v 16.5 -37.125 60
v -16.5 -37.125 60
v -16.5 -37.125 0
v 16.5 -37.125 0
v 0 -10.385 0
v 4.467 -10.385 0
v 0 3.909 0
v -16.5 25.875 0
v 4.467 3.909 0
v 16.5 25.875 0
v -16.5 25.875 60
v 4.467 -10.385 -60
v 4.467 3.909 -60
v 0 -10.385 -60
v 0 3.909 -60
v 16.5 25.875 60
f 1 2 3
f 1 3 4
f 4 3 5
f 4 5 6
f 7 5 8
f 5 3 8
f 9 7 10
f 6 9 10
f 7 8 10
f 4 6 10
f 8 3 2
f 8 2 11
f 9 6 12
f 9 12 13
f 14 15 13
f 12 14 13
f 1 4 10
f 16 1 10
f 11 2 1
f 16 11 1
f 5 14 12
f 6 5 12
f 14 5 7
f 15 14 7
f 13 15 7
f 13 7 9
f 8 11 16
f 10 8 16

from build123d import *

# Parameters (mm, degrees)
SKETCH1_W           = 33
SKETCH1_H           = 63
BOSS_EXTRUDE1_DEPTH = 60
SKETCH1_3_W         = 4.466715852
SKETCH1_3_H         = 14.293859793
BOSS_EXTRUDE2_DEPTH = 60


with BuildPart() as part:
    # Sketch1 → Boss-Extrude1 (new body)
    with BuildSketch(Plane.XY):
        with Locations((0, -5.625)):
            Rectangle(SKETCH1_W, SKETCH1_H)
    extrude(amount=BOSS_EXTRUDE1_DEPTH)

    # Sketch1<3> → Boss-Extrude2 (add)
    with BuildSketch(Plane.XY):
        with Locations((2.233357926, -3.23810571)):
            Rectangle(SKETCH1_3_W, SKETCH1_3_H)
    extrude(amount=-BOSS_EXTRUDE2_DEPTH)


solid = part.part
